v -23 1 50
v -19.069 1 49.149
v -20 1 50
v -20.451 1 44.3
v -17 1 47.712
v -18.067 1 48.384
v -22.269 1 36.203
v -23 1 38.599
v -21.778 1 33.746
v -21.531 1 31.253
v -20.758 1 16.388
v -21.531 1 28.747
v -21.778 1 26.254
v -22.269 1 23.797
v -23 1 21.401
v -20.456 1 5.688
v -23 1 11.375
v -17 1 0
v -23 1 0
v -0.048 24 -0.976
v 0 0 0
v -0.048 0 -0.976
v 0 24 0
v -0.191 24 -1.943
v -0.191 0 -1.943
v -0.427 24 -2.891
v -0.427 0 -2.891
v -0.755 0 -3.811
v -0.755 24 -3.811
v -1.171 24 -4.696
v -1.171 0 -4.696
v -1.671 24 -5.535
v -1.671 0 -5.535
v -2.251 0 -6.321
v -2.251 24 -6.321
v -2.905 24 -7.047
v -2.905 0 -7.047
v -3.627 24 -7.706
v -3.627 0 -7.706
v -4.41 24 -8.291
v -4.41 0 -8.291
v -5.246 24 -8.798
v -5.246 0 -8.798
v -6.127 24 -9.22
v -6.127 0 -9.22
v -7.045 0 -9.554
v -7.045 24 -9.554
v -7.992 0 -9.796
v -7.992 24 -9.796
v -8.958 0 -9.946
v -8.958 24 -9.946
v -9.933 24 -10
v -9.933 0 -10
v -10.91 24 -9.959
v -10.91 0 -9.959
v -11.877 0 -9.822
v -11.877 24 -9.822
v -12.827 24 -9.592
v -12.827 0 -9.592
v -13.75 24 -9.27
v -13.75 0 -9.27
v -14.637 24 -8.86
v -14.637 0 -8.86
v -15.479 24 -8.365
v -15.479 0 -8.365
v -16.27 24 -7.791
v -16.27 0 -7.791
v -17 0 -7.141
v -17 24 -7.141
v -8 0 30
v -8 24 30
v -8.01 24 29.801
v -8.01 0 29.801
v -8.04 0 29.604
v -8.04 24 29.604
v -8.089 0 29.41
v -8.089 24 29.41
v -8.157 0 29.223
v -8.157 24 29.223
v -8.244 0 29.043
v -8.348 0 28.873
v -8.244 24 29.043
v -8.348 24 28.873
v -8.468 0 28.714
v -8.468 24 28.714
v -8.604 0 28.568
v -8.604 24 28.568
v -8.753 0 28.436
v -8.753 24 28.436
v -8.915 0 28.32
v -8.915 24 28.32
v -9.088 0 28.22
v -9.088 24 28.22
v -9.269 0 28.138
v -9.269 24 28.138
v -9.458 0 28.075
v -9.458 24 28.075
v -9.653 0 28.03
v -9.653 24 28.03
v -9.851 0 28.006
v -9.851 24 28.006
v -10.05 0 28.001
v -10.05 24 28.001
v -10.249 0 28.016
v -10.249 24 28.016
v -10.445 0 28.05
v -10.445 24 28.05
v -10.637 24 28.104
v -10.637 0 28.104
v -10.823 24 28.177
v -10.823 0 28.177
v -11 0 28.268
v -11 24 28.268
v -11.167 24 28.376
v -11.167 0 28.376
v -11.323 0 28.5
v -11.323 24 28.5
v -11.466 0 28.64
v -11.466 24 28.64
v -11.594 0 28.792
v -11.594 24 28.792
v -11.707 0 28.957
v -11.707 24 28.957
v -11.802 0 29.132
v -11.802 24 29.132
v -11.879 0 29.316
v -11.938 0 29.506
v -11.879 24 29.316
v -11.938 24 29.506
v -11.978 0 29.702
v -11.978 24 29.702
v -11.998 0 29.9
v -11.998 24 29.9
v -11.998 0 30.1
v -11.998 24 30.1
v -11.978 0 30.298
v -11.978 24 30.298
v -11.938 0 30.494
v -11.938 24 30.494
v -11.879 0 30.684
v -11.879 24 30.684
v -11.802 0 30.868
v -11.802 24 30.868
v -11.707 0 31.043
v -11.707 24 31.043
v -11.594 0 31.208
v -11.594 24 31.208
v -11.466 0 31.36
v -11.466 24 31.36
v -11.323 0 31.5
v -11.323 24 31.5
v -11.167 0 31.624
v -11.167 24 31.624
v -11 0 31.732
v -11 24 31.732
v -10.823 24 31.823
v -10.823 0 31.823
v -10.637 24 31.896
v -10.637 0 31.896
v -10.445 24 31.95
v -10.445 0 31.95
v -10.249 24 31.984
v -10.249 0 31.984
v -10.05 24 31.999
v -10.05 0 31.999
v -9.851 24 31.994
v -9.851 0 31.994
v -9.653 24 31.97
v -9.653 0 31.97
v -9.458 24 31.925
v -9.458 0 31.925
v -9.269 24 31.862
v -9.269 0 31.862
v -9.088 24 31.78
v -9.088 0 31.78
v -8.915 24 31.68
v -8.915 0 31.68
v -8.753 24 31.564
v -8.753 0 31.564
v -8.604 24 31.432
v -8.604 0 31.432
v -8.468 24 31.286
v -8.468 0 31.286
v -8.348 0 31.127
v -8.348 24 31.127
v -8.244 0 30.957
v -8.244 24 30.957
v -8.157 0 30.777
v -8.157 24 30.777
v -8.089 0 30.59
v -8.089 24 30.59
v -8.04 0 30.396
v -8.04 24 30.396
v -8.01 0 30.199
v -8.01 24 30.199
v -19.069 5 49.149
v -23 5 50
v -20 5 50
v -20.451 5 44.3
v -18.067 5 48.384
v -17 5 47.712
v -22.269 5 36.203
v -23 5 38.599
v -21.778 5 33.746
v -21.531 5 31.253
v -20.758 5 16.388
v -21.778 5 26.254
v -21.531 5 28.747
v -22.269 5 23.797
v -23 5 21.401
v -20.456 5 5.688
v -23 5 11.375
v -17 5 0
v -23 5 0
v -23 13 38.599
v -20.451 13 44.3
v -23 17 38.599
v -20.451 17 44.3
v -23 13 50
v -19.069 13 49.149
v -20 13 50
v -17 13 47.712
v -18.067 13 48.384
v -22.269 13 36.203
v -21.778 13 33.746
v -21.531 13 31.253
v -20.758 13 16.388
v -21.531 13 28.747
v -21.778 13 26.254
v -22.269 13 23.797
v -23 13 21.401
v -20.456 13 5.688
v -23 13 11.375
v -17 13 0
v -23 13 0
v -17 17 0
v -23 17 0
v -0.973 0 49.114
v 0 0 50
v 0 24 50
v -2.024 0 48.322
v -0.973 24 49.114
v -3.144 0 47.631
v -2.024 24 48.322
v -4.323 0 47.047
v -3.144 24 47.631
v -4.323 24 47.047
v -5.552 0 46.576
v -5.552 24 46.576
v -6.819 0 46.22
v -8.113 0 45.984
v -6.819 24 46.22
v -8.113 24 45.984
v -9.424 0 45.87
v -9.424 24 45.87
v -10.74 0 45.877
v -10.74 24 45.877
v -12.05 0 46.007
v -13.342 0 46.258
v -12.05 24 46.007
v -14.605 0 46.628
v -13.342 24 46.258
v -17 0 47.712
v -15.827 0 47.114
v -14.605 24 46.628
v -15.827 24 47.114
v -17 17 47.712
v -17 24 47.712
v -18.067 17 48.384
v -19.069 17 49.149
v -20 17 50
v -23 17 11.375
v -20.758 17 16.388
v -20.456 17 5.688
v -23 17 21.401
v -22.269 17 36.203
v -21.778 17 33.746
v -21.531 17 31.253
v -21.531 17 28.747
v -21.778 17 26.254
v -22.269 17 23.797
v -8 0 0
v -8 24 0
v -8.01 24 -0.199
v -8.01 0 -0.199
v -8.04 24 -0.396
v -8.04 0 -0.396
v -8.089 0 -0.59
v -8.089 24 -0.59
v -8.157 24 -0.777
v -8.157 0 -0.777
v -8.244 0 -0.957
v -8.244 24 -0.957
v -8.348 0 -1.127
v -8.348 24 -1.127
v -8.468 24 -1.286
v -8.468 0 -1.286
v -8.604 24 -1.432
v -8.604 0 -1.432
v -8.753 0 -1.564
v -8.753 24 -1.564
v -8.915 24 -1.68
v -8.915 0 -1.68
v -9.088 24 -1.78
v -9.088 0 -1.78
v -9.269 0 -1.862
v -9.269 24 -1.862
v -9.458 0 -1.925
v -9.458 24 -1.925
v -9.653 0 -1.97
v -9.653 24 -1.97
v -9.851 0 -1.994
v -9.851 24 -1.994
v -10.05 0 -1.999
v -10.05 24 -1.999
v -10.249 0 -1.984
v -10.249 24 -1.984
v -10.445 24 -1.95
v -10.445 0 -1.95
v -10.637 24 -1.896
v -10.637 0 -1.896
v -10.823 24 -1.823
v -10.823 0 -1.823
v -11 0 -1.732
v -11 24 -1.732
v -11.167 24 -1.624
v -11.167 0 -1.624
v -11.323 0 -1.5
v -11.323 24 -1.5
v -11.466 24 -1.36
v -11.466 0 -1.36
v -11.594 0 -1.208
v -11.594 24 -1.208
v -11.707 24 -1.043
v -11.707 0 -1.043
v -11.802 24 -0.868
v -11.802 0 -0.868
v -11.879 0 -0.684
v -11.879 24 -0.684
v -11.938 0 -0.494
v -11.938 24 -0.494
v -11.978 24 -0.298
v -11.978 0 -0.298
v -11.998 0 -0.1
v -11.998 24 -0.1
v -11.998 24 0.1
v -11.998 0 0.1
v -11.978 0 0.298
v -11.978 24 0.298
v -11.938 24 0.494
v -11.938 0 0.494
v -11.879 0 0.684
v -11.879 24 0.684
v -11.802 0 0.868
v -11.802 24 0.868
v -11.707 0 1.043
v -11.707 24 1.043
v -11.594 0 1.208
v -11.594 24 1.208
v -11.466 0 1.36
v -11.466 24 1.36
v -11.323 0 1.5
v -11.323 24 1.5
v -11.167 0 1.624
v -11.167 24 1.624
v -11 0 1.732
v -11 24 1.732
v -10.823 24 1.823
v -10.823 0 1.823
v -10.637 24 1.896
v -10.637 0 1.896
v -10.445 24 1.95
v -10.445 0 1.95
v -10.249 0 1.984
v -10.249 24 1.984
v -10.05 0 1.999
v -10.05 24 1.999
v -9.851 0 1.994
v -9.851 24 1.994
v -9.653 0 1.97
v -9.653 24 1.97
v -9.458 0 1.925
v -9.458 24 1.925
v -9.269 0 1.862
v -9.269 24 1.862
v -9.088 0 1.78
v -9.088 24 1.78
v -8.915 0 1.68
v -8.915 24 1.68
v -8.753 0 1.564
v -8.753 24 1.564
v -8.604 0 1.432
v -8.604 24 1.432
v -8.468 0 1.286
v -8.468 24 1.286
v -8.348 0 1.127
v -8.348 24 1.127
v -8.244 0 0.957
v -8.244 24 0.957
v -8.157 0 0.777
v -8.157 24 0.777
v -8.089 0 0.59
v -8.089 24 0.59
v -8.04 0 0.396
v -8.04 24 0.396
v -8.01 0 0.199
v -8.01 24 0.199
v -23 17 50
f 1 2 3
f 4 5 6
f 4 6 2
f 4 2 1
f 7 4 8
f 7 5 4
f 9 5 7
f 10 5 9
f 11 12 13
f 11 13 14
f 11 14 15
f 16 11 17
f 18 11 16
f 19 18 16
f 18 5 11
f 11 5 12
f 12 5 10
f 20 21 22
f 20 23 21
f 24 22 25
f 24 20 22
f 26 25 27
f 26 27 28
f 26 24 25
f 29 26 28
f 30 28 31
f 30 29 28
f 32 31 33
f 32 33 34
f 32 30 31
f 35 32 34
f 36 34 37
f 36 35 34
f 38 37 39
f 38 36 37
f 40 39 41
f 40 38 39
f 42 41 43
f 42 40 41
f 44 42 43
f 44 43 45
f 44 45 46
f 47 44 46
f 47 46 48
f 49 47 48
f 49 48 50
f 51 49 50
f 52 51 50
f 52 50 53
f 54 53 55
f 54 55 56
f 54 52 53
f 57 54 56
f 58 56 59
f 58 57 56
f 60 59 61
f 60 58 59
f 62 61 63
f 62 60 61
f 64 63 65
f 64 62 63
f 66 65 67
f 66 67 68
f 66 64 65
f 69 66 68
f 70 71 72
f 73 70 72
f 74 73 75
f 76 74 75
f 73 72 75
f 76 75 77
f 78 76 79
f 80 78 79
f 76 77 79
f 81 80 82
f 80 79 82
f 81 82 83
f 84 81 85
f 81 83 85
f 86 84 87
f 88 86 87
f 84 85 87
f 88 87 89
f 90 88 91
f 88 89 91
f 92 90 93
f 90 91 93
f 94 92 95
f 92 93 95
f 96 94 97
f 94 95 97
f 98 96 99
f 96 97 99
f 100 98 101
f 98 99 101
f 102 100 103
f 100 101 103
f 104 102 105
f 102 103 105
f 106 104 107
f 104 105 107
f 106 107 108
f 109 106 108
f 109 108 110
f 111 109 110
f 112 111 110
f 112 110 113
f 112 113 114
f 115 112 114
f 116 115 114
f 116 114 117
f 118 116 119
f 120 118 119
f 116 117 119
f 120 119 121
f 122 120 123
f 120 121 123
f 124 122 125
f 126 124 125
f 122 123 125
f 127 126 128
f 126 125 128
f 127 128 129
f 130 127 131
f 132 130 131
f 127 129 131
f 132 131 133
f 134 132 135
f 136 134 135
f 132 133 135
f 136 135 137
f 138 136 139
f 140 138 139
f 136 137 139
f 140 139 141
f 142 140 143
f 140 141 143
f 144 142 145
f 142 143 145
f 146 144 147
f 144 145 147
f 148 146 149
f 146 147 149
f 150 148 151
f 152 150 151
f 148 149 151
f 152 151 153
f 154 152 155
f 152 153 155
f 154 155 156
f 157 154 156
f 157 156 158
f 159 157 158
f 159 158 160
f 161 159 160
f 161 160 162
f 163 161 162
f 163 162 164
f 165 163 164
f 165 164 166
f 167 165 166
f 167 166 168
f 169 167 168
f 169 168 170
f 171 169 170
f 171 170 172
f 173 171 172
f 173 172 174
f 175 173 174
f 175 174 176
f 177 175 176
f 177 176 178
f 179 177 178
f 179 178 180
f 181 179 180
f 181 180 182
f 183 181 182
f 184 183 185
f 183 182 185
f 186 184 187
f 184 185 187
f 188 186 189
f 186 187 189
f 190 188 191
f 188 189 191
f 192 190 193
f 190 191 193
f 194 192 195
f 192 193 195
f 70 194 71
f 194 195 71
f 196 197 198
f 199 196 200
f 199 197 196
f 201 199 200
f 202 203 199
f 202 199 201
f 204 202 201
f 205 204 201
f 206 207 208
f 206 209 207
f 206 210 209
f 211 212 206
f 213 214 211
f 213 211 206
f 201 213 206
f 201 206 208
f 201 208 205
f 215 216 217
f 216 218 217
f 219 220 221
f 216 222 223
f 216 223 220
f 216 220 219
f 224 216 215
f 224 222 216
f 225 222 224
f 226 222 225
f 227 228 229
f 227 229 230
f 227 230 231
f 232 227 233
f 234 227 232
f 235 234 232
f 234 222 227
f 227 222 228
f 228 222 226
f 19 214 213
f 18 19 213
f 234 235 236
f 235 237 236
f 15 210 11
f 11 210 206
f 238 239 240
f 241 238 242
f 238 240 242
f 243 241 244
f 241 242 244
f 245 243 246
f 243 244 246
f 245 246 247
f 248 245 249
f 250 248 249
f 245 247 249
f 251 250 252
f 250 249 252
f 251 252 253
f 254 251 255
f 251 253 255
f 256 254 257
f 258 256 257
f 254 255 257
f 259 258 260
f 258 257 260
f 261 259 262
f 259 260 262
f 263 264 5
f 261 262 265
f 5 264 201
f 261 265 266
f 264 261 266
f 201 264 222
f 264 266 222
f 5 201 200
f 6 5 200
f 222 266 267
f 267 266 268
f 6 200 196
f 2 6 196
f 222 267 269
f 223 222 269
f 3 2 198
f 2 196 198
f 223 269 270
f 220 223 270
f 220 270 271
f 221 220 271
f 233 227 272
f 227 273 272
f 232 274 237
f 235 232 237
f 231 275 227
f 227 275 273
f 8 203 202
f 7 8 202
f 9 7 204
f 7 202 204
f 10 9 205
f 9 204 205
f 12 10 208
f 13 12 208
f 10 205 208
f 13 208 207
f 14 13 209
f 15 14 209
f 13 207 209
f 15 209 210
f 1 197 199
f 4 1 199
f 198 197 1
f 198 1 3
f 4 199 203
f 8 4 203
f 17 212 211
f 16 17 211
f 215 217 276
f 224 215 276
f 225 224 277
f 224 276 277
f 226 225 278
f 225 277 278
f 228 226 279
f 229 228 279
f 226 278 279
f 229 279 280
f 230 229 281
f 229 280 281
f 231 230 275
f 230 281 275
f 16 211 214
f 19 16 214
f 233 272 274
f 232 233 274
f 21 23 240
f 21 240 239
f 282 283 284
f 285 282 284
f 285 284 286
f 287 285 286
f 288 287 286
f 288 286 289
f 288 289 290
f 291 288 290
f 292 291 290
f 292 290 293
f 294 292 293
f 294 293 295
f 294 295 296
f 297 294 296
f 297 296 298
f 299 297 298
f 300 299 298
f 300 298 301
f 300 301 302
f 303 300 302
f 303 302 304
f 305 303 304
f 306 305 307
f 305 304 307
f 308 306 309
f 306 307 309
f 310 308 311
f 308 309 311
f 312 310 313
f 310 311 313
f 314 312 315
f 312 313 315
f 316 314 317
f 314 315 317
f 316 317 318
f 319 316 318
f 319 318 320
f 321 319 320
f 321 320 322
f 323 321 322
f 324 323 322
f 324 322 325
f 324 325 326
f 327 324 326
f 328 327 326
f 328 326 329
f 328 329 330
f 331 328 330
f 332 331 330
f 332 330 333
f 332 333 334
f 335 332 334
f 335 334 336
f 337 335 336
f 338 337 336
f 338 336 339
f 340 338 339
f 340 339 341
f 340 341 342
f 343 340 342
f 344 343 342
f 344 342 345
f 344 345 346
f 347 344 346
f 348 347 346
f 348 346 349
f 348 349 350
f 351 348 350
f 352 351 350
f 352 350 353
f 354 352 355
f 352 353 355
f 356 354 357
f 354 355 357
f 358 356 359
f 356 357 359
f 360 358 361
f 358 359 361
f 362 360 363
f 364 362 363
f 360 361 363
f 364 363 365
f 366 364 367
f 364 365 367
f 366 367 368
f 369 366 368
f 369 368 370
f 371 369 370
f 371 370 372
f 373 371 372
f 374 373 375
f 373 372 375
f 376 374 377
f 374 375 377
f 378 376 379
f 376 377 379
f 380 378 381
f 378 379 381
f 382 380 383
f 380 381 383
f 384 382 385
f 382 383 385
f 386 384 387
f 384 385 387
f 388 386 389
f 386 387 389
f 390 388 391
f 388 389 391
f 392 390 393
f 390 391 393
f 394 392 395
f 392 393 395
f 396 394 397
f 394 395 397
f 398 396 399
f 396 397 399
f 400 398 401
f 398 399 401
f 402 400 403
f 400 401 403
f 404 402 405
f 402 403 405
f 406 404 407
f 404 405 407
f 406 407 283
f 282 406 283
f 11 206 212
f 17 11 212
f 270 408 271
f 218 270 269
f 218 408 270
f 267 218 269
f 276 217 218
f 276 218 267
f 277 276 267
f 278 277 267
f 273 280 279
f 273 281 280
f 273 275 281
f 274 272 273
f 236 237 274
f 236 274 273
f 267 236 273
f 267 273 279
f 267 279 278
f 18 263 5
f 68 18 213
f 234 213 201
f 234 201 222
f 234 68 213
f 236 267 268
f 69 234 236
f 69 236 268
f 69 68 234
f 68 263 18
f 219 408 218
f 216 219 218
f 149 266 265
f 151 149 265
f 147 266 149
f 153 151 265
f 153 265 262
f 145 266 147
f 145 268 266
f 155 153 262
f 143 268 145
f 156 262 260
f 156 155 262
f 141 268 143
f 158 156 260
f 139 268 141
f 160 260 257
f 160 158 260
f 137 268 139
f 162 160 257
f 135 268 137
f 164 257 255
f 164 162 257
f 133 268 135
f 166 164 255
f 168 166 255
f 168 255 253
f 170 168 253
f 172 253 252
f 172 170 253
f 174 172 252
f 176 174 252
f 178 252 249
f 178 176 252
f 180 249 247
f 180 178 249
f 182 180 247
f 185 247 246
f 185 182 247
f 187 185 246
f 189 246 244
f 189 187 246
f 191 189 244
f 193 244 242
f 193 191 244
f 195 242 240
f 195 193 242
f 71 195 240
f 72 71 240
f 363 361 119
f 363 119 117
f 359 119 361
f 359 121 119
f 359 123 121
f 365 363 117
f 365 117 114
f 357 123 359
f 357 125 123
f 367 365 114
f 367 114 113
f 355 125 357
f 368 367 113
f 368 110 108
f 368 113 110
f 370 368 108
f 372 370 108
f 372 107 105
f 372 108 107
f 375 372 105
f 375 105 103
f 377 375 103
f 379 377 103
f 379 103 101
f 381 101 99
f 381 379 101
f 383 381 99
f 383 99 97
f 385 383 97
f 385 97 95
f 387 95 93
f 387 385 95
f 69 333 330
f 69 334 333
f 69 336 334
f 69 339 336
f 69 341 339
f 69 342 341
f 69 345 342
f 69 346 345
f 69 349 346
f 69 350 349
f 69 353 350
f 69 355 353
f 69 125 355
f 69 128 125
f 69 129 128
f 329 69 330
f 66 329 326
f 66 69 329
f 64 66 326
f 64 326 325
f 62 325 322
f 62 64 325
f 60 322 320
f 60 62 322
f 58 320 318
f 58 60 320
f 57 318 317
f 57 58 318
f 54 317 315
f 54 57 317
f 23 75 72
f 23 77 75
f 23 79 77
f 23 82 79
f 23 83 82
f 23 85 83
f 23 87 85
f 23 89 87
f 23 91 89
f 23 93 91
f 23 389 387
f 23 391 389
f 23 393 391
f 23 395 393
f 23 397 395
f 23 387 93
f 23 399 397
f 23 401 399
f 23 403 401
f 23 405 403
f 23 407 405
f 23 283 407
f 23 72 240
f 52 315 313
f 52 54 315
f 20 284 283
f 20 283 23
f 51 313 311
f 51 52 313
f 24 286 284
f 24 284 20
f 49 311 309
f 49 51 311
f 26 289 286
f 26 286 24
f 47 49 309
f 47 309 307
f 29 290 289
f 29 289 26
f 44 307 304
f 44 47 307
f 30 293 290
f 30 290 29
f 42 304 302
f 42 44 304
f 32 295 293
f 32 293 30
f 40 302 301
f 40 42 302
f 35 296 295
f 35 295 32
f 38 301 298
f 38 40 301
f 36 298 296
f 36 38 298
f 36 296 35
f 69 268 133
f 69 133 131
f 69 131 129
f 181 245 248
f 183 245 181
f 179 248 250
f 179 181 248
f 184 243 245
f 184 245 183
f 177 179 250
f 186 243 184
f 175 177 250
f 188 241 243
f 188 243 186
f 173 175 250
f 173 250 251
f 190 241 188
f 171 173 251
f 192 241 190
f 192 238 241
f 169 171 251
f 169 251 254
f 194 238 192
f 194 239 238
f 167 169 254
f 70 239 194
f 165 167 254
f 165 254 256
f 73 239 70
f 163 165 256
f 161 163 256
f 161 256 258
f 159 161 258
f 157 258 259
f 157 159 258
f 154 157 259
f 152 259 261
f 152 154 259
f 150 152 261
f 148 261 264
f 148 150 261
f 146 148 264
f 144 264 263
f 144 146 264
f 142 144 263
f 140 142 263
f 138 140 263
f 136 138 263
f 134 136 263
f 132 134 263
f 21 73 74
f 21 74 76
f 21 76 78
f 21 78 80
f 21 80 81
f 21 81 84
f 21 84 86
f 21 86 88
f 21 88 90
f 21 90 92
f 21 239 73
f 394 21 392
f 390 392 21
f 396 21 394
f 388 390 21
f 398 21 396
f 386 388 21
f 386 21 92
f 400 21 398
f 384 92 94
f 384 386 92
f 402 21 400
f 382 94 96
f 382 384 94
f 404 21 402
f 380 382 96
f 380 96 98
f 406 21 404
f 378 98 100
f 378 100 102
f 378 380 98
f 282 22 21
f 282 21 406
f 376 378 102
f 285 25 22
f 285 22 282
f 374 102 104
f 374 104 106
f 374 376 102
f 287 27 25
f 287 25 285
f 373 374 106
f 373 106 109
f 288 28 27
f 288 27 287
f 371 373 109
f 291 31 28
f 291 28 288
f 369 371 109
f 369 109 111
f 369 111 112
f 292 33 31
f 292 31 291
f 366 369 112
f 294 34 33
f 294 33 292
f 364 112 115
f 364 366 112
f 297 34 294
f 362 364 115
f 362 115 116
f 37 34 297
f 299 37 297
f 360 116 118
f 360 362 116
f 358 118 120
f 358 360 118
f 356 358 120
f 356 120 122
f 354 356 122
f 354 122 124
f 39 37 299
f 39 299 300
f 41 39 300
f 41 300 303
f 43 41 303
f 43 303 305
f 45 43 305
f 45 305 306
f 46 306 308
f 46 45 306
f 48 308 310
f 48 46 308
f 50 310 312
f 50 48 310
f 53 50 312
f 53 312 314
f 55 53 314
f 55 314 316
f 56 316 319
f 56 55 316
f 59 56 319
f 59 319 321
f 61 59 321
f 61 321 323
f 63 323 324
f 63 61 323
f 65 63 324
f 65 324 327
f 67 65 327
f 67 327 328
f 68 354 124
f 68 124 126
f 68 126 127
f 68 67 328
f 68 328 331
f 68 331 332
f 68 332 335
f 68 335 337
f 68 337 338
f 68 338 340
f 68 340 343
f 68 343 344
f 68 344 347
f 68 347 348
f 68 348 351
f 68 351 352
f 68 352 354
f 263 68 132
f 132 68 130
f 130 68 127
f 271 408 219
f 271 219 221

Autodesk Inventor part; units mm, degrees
ref_plane "YZ Plane" through (0, 0, 0) normal (1, 0, 0) x (0, 1, 0)
ref_plane "XZ Plane" through (0, 0, 0) normal (0, 1, 0) x (-1, 0, 0)
ref_plane "XY Plane" through (0, 0, 0) normal (0, 0, 1) x (1, 0, 0)
sketch "Sketch1" plane through (0, 0, 0) normal (0, 0, 1) x (1, 0, 0)
  line L0 (-17, 0) -> (-17, 1)
  line L1 (-17, 1) -> (-23, 1)
  line L2 (-23, 1) -> (-23, 5)
  line L3 (-23, 5) -> (-17, 5)
  line L4 (-17, 5) -> (-17, 13)
  line L5 (-17, 13) -> (-23, 13)
  line L6 (-23, 13) -> (-23, 17)
  line L7 (-23, 17) -> (-17, 17)
  line L8 (-17, 17) -> (-17, 24)
  line L9 (-17, 24) -> (0, 24)
  line L10 (0, 24) -> (0, 0)
  line L11 (0, 0) -> (-17, 0)
  dimension "d0" = 4
  dimension "d1" = 17
  dimension "d2" = 1
  dimension "d3" = 24
  dimension "d4" = 6
  dimension "d5" = 8
extrude "Extrusion1" add sketch "Sketch1" along normal blind 50
sketch "Sketch2" plane through (-17, 24, 0) normal (0, 1, 0) x (1, 0, 0)
  line L0 (17, 0) -> (0, 0) projected
  line L1 (0, 0) -> (0, -50) projected
  line L2 (0, 0) -> (17, 0) projected
  line L3 (0, 0) -> (0, 7.1414)
  line L4 (17, 0) -> (17, -50) projected
  line L5 (0, 0) -> (17, 0)
  arc A0 (17, 0) -> (0, 7.1414) centre (7, 0) ccw
  dimension "d9" = 10
extrude "Extrusion2" add sketch "Sketch2" against normal blind 24
sketch "Sketch3" plane through (-17, 24, 50) normal (0, 1, 0) x (1, 0, 0)
  arc A0 (17, 50) -> (0, 57.1414) centre (7, 50) ccw projected
  circle A1 centre (7, 50) radius 2
  circle A2 centre (7, 20) radius 2
  line L0 (0, 50) -> (0, 0) projected
  line L1 (7, 50) -> (7, -10) construction
  line L2 (17, 0) -> (0, 0) construction
  arc A3 (17, 0) -> (-3, 0) centre (7, -10) ccw
  line L3 (17, 50) -> (17, 0) construction
  line L4 (-3, 0) -> (17, 0)
  line L5 (-6, 50) -> (-6, 0) construction
  line L6 (-6, 11.4006) -> (-6, 28.5994)
  arc A4 (-6, 11.4006) -> (-6, 28.5994) centre (-29.9, 20) ccw
  line L7 (7, 20) -> (-4.5, 20) construction
  line L8 (-6, 0) -> (-3.4507, 5.7003)
  line L9 (-3.4507, 5.7003) -> (-6, 11.4006)
  line L10 (-6, 28.5994) -> (-3.7582, 33.612)
  line L11 (-3.7582, 33.612) -> (-6, 38.6246)
  line L12 (-6, 38.6246) -> (-3.4563, 44.3123)
  line L13 (-3.4563, 44.3123) -> (-6, 50)
  line L14 (-6, 0) -> (-6, 11.4006)
  line L15 (-6, 28.5994) -> (-6, 38.6246)
  line L16 (-6, 38.6246) -> (-6, 50)
  dimension "d12" = 4
  dimension "d13" = 60
  dimension "d14" = 11.5
  dimension "d15" = 25.4
extrude "Extrusion3" cut sketch "Sketch3" against normal through all
properties part number "clawGrip" material "Rubber"
